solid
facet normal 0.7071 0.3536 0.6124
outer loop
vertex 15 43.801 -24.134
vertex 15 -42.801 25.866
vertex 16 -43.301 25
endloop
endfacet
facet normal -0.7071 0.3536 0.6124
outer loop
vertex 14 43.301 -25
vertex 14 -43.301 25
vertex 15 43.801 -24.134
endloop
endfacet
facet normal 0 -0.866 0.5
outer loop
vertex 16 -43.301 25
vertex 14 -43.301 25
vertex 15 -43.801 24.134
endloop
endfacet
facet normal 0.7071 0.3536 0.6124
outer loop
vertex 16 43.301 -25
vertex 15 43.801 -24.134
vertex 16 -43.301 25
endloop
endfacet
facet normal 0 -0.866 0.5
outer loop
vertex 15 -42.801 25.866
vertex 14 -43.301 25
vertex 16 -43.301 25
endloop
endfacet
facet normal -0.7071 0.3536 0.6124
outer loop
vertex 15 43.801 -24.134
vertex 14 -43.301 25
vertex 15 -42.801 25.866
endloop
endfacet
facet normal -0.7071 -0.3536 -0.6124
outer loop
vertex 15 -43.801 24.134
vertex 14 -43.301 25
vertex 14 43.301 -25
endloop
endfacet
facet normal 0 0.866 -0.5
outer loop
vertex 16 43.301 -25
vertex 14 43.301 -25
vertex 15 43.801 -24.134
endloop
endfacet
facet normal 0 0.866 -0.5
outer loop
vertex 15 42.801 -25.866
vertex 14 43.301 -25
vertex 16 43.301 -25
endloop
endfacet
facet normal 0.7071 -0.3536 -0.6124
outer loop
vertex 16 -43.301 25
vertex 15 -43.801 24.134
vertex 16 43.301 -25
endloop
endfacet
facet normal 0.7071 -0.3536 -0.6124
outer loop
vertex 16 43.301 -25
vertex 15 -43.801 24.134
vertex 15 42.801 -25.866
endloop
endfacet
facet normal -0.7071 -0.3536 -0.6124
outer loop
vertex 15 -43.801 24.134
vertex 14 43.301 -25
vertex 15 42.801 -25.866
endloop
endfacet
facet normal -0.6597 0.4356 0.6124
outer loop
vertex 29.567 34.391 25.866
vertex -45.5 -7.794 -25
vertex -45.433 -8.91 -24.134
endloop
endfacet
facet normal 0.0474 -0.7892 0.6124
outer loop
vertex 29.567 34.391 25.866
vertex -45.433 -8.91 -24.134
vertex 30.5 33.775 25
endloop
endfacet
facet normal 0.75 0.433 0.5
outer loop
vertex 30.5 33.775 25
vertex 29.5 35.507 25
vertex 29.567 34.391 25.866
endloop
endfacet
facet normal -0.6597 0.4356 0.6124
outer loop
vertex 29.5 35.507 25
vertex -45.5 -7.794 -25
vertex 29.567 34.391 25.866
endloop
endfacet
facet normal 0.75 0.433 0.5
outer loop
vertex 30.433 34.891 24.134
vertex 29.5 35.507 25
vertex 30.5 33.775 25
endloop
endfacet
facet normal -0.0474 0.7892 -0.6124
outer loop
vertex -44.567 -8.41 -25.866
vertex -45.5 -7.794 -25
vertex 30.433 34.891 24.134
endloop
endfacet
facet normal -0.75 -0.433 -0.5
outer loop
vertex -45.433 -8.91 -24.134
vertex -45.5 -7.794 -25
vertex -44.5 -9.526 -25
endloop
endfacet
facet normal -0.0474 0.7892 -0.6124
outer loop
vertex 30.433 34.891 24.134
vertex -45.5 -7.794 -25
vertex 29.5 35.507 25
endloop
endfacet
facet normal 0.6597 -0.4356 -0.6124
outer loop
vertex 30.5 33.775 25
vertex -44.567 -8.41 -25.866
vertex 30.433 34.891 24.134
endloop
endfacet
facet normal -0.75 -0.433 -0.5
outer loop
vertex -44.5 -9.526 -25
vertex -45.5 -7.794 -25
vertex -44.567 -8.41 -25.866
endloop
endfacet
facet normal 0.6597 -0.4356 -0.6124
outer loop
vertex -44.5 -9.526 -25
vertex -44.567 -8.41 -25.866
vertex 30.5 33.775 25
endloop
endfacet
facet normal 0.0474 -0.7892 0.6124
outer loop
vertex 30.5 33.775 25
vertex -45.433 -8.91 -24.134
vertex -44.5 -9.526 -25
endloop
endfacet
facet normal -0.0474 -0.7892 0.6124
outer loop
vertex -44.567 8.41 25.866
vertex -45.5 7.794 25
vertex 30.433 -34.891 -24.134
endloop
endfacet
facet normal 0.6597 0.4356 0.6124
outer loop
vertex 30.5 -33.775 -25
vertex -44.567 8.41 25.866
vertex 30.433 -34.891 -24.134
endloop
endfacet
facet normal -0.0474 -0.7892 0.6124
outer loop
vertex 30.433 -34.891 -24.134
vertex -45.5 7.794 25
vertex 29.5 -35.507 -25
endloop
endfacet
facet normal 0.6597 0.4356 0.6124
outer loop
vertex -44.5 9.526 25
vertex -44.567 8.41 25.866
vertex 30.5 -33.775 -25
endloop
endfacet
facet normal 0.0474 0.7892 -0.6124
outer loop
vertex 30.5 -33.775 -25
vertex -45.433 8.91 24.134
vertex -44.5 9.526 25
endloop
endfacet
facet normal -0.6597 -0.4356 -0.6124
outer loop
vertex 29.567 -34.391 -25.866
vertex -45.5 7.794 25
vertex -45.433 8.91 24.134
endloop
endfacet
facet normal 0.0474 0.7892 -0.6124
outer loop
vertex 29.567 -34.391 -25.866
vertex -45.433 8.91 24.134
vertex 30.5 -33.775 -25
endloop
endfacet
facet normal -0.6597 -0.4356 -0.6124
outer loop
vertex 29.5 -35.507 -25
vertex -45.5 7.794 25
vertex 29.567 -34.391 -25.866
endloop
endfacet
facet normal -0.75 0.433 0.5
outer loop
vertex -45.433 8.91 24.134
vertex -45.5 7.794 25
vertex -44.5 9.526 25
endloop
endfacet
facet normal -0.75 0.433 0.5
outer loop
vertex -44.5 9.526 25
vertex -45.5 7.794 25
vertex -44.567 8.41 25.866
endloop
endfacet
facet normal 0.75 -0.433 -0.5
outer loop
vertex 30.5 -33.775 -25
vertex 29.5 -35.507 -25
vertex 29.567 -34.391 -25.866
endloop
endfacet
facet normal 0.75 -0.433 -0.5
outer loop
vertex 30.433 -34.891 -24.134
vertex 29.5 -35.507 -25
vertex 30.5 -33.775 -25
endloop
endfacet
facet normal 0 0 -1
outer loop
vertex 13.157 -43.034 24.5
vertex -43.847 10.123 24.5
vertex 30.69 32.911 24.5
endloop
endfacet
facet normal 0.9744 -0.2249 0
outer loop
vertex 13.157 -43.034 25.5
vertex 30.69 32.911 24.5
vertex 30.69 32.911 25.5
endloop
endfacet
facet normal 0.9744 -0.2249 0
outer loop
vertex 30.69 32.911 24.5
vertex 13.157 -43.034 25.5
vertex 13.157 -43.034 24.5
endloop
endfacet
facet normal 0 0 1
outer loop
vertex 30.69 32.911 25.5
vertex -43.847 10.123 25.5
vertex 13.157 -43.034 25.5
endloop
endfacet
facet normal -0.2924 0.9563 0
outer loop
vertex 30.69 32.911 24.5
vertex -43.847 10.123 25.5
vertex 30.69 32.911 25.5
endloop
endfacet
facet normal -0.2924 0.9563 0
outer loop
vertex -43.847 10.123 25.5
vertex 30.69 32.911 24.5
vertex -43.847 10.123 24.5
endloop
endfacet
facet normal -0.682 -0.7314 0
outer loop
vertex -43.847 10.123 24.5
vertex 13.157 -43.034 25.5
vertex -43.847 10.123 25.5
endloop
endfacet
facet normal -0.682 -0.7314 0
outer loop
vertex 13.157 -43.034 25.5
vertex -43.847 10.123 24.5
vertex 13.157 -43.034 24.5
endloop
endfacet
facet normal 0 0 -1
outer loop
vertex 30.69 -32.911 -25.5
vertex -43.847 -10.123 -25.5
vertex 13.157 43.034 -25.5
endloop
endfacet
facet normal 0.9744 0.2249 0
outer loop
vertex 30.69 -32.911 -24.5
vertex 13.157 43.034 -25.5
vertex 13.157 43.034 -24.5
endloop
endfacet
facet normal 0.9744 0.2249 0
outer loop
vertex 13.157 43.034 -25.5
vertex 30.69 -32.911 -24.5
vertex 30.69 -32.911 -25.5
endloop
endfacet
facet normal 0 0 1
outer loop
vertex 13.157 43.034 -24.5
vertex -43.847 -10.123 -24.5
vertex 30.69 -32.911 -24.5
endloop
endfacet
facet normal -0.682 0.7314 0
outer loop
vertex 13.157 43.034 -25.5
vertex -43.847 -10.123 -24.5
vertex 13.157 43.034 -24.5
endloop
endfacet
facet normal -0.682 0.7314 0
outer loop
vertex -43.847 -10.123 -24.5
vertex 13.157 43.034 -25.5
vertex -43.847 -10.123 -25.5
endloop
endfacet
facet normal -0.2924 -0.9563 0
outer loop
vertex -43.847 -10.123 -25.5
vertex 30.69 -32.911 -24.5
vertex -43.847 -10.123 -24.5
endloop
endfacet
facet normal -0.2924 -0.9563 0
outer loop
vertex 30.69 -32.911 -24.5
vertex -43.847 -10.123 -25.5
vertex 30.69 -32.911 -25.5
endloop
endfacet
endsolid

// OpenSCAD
offset = 78;
y_fudge = 10;
N = 5;

//for(
//    x = [-offset*N : offset             : offset*N],
//    y = [-offset*N : 2*(offset-y_fudge) : offset*N]
//){
//    translate([x, y, 0]) cell();
//    translate([x-40, y + offset-y_fudge, 0]) cell();
//}


module strut(r, a, n){
    translate([r,0,0])
    rotate([a,0,0])
    cylinder(h = n, r = n/100, center = true, $fn=4);
}

module struts(r, a, n){
    strut(r, a, n);
    rotate(120, [0, 0, 1]) strut(r, a, n);
    rotate(240, [0, 0, 1]) strut(r, a, n);
}

module sail(r, a, n, z, t){
    rotate(r, [0, 0, 1])
    translate([
        -t / 2, -t * sqrt(3) / 6, // Centered.
        z * n / 2 * cos(a) // Raised/lowered.
    ])
    linear_extrude(height=1, center=true)
    // Equilateral triangle of side length t.
    polygon([[0,0], [t, 0], [t * cos(60), t * sin(60)]]);
}

module sails(r, a, n){
    // These are sail values, should be done by math
    rot_upper = 77;
    rot_lower = 103;
    t = n * sin(a) * .9; // length of side of triangle
    sail(rot_upper, a, n, 1, t);
    sail(rot_lower, a, n, -1, t);
}

module cell(r, a, n){
    color("DarkGreen") struts(r, a, n);
    color("Linen", 0.70) sails(r, a, n);
}


n = 100; // unit strut length
r = 15; // strut distance from center
a = 60; // strut rotation angle
cell(r, a, n);
